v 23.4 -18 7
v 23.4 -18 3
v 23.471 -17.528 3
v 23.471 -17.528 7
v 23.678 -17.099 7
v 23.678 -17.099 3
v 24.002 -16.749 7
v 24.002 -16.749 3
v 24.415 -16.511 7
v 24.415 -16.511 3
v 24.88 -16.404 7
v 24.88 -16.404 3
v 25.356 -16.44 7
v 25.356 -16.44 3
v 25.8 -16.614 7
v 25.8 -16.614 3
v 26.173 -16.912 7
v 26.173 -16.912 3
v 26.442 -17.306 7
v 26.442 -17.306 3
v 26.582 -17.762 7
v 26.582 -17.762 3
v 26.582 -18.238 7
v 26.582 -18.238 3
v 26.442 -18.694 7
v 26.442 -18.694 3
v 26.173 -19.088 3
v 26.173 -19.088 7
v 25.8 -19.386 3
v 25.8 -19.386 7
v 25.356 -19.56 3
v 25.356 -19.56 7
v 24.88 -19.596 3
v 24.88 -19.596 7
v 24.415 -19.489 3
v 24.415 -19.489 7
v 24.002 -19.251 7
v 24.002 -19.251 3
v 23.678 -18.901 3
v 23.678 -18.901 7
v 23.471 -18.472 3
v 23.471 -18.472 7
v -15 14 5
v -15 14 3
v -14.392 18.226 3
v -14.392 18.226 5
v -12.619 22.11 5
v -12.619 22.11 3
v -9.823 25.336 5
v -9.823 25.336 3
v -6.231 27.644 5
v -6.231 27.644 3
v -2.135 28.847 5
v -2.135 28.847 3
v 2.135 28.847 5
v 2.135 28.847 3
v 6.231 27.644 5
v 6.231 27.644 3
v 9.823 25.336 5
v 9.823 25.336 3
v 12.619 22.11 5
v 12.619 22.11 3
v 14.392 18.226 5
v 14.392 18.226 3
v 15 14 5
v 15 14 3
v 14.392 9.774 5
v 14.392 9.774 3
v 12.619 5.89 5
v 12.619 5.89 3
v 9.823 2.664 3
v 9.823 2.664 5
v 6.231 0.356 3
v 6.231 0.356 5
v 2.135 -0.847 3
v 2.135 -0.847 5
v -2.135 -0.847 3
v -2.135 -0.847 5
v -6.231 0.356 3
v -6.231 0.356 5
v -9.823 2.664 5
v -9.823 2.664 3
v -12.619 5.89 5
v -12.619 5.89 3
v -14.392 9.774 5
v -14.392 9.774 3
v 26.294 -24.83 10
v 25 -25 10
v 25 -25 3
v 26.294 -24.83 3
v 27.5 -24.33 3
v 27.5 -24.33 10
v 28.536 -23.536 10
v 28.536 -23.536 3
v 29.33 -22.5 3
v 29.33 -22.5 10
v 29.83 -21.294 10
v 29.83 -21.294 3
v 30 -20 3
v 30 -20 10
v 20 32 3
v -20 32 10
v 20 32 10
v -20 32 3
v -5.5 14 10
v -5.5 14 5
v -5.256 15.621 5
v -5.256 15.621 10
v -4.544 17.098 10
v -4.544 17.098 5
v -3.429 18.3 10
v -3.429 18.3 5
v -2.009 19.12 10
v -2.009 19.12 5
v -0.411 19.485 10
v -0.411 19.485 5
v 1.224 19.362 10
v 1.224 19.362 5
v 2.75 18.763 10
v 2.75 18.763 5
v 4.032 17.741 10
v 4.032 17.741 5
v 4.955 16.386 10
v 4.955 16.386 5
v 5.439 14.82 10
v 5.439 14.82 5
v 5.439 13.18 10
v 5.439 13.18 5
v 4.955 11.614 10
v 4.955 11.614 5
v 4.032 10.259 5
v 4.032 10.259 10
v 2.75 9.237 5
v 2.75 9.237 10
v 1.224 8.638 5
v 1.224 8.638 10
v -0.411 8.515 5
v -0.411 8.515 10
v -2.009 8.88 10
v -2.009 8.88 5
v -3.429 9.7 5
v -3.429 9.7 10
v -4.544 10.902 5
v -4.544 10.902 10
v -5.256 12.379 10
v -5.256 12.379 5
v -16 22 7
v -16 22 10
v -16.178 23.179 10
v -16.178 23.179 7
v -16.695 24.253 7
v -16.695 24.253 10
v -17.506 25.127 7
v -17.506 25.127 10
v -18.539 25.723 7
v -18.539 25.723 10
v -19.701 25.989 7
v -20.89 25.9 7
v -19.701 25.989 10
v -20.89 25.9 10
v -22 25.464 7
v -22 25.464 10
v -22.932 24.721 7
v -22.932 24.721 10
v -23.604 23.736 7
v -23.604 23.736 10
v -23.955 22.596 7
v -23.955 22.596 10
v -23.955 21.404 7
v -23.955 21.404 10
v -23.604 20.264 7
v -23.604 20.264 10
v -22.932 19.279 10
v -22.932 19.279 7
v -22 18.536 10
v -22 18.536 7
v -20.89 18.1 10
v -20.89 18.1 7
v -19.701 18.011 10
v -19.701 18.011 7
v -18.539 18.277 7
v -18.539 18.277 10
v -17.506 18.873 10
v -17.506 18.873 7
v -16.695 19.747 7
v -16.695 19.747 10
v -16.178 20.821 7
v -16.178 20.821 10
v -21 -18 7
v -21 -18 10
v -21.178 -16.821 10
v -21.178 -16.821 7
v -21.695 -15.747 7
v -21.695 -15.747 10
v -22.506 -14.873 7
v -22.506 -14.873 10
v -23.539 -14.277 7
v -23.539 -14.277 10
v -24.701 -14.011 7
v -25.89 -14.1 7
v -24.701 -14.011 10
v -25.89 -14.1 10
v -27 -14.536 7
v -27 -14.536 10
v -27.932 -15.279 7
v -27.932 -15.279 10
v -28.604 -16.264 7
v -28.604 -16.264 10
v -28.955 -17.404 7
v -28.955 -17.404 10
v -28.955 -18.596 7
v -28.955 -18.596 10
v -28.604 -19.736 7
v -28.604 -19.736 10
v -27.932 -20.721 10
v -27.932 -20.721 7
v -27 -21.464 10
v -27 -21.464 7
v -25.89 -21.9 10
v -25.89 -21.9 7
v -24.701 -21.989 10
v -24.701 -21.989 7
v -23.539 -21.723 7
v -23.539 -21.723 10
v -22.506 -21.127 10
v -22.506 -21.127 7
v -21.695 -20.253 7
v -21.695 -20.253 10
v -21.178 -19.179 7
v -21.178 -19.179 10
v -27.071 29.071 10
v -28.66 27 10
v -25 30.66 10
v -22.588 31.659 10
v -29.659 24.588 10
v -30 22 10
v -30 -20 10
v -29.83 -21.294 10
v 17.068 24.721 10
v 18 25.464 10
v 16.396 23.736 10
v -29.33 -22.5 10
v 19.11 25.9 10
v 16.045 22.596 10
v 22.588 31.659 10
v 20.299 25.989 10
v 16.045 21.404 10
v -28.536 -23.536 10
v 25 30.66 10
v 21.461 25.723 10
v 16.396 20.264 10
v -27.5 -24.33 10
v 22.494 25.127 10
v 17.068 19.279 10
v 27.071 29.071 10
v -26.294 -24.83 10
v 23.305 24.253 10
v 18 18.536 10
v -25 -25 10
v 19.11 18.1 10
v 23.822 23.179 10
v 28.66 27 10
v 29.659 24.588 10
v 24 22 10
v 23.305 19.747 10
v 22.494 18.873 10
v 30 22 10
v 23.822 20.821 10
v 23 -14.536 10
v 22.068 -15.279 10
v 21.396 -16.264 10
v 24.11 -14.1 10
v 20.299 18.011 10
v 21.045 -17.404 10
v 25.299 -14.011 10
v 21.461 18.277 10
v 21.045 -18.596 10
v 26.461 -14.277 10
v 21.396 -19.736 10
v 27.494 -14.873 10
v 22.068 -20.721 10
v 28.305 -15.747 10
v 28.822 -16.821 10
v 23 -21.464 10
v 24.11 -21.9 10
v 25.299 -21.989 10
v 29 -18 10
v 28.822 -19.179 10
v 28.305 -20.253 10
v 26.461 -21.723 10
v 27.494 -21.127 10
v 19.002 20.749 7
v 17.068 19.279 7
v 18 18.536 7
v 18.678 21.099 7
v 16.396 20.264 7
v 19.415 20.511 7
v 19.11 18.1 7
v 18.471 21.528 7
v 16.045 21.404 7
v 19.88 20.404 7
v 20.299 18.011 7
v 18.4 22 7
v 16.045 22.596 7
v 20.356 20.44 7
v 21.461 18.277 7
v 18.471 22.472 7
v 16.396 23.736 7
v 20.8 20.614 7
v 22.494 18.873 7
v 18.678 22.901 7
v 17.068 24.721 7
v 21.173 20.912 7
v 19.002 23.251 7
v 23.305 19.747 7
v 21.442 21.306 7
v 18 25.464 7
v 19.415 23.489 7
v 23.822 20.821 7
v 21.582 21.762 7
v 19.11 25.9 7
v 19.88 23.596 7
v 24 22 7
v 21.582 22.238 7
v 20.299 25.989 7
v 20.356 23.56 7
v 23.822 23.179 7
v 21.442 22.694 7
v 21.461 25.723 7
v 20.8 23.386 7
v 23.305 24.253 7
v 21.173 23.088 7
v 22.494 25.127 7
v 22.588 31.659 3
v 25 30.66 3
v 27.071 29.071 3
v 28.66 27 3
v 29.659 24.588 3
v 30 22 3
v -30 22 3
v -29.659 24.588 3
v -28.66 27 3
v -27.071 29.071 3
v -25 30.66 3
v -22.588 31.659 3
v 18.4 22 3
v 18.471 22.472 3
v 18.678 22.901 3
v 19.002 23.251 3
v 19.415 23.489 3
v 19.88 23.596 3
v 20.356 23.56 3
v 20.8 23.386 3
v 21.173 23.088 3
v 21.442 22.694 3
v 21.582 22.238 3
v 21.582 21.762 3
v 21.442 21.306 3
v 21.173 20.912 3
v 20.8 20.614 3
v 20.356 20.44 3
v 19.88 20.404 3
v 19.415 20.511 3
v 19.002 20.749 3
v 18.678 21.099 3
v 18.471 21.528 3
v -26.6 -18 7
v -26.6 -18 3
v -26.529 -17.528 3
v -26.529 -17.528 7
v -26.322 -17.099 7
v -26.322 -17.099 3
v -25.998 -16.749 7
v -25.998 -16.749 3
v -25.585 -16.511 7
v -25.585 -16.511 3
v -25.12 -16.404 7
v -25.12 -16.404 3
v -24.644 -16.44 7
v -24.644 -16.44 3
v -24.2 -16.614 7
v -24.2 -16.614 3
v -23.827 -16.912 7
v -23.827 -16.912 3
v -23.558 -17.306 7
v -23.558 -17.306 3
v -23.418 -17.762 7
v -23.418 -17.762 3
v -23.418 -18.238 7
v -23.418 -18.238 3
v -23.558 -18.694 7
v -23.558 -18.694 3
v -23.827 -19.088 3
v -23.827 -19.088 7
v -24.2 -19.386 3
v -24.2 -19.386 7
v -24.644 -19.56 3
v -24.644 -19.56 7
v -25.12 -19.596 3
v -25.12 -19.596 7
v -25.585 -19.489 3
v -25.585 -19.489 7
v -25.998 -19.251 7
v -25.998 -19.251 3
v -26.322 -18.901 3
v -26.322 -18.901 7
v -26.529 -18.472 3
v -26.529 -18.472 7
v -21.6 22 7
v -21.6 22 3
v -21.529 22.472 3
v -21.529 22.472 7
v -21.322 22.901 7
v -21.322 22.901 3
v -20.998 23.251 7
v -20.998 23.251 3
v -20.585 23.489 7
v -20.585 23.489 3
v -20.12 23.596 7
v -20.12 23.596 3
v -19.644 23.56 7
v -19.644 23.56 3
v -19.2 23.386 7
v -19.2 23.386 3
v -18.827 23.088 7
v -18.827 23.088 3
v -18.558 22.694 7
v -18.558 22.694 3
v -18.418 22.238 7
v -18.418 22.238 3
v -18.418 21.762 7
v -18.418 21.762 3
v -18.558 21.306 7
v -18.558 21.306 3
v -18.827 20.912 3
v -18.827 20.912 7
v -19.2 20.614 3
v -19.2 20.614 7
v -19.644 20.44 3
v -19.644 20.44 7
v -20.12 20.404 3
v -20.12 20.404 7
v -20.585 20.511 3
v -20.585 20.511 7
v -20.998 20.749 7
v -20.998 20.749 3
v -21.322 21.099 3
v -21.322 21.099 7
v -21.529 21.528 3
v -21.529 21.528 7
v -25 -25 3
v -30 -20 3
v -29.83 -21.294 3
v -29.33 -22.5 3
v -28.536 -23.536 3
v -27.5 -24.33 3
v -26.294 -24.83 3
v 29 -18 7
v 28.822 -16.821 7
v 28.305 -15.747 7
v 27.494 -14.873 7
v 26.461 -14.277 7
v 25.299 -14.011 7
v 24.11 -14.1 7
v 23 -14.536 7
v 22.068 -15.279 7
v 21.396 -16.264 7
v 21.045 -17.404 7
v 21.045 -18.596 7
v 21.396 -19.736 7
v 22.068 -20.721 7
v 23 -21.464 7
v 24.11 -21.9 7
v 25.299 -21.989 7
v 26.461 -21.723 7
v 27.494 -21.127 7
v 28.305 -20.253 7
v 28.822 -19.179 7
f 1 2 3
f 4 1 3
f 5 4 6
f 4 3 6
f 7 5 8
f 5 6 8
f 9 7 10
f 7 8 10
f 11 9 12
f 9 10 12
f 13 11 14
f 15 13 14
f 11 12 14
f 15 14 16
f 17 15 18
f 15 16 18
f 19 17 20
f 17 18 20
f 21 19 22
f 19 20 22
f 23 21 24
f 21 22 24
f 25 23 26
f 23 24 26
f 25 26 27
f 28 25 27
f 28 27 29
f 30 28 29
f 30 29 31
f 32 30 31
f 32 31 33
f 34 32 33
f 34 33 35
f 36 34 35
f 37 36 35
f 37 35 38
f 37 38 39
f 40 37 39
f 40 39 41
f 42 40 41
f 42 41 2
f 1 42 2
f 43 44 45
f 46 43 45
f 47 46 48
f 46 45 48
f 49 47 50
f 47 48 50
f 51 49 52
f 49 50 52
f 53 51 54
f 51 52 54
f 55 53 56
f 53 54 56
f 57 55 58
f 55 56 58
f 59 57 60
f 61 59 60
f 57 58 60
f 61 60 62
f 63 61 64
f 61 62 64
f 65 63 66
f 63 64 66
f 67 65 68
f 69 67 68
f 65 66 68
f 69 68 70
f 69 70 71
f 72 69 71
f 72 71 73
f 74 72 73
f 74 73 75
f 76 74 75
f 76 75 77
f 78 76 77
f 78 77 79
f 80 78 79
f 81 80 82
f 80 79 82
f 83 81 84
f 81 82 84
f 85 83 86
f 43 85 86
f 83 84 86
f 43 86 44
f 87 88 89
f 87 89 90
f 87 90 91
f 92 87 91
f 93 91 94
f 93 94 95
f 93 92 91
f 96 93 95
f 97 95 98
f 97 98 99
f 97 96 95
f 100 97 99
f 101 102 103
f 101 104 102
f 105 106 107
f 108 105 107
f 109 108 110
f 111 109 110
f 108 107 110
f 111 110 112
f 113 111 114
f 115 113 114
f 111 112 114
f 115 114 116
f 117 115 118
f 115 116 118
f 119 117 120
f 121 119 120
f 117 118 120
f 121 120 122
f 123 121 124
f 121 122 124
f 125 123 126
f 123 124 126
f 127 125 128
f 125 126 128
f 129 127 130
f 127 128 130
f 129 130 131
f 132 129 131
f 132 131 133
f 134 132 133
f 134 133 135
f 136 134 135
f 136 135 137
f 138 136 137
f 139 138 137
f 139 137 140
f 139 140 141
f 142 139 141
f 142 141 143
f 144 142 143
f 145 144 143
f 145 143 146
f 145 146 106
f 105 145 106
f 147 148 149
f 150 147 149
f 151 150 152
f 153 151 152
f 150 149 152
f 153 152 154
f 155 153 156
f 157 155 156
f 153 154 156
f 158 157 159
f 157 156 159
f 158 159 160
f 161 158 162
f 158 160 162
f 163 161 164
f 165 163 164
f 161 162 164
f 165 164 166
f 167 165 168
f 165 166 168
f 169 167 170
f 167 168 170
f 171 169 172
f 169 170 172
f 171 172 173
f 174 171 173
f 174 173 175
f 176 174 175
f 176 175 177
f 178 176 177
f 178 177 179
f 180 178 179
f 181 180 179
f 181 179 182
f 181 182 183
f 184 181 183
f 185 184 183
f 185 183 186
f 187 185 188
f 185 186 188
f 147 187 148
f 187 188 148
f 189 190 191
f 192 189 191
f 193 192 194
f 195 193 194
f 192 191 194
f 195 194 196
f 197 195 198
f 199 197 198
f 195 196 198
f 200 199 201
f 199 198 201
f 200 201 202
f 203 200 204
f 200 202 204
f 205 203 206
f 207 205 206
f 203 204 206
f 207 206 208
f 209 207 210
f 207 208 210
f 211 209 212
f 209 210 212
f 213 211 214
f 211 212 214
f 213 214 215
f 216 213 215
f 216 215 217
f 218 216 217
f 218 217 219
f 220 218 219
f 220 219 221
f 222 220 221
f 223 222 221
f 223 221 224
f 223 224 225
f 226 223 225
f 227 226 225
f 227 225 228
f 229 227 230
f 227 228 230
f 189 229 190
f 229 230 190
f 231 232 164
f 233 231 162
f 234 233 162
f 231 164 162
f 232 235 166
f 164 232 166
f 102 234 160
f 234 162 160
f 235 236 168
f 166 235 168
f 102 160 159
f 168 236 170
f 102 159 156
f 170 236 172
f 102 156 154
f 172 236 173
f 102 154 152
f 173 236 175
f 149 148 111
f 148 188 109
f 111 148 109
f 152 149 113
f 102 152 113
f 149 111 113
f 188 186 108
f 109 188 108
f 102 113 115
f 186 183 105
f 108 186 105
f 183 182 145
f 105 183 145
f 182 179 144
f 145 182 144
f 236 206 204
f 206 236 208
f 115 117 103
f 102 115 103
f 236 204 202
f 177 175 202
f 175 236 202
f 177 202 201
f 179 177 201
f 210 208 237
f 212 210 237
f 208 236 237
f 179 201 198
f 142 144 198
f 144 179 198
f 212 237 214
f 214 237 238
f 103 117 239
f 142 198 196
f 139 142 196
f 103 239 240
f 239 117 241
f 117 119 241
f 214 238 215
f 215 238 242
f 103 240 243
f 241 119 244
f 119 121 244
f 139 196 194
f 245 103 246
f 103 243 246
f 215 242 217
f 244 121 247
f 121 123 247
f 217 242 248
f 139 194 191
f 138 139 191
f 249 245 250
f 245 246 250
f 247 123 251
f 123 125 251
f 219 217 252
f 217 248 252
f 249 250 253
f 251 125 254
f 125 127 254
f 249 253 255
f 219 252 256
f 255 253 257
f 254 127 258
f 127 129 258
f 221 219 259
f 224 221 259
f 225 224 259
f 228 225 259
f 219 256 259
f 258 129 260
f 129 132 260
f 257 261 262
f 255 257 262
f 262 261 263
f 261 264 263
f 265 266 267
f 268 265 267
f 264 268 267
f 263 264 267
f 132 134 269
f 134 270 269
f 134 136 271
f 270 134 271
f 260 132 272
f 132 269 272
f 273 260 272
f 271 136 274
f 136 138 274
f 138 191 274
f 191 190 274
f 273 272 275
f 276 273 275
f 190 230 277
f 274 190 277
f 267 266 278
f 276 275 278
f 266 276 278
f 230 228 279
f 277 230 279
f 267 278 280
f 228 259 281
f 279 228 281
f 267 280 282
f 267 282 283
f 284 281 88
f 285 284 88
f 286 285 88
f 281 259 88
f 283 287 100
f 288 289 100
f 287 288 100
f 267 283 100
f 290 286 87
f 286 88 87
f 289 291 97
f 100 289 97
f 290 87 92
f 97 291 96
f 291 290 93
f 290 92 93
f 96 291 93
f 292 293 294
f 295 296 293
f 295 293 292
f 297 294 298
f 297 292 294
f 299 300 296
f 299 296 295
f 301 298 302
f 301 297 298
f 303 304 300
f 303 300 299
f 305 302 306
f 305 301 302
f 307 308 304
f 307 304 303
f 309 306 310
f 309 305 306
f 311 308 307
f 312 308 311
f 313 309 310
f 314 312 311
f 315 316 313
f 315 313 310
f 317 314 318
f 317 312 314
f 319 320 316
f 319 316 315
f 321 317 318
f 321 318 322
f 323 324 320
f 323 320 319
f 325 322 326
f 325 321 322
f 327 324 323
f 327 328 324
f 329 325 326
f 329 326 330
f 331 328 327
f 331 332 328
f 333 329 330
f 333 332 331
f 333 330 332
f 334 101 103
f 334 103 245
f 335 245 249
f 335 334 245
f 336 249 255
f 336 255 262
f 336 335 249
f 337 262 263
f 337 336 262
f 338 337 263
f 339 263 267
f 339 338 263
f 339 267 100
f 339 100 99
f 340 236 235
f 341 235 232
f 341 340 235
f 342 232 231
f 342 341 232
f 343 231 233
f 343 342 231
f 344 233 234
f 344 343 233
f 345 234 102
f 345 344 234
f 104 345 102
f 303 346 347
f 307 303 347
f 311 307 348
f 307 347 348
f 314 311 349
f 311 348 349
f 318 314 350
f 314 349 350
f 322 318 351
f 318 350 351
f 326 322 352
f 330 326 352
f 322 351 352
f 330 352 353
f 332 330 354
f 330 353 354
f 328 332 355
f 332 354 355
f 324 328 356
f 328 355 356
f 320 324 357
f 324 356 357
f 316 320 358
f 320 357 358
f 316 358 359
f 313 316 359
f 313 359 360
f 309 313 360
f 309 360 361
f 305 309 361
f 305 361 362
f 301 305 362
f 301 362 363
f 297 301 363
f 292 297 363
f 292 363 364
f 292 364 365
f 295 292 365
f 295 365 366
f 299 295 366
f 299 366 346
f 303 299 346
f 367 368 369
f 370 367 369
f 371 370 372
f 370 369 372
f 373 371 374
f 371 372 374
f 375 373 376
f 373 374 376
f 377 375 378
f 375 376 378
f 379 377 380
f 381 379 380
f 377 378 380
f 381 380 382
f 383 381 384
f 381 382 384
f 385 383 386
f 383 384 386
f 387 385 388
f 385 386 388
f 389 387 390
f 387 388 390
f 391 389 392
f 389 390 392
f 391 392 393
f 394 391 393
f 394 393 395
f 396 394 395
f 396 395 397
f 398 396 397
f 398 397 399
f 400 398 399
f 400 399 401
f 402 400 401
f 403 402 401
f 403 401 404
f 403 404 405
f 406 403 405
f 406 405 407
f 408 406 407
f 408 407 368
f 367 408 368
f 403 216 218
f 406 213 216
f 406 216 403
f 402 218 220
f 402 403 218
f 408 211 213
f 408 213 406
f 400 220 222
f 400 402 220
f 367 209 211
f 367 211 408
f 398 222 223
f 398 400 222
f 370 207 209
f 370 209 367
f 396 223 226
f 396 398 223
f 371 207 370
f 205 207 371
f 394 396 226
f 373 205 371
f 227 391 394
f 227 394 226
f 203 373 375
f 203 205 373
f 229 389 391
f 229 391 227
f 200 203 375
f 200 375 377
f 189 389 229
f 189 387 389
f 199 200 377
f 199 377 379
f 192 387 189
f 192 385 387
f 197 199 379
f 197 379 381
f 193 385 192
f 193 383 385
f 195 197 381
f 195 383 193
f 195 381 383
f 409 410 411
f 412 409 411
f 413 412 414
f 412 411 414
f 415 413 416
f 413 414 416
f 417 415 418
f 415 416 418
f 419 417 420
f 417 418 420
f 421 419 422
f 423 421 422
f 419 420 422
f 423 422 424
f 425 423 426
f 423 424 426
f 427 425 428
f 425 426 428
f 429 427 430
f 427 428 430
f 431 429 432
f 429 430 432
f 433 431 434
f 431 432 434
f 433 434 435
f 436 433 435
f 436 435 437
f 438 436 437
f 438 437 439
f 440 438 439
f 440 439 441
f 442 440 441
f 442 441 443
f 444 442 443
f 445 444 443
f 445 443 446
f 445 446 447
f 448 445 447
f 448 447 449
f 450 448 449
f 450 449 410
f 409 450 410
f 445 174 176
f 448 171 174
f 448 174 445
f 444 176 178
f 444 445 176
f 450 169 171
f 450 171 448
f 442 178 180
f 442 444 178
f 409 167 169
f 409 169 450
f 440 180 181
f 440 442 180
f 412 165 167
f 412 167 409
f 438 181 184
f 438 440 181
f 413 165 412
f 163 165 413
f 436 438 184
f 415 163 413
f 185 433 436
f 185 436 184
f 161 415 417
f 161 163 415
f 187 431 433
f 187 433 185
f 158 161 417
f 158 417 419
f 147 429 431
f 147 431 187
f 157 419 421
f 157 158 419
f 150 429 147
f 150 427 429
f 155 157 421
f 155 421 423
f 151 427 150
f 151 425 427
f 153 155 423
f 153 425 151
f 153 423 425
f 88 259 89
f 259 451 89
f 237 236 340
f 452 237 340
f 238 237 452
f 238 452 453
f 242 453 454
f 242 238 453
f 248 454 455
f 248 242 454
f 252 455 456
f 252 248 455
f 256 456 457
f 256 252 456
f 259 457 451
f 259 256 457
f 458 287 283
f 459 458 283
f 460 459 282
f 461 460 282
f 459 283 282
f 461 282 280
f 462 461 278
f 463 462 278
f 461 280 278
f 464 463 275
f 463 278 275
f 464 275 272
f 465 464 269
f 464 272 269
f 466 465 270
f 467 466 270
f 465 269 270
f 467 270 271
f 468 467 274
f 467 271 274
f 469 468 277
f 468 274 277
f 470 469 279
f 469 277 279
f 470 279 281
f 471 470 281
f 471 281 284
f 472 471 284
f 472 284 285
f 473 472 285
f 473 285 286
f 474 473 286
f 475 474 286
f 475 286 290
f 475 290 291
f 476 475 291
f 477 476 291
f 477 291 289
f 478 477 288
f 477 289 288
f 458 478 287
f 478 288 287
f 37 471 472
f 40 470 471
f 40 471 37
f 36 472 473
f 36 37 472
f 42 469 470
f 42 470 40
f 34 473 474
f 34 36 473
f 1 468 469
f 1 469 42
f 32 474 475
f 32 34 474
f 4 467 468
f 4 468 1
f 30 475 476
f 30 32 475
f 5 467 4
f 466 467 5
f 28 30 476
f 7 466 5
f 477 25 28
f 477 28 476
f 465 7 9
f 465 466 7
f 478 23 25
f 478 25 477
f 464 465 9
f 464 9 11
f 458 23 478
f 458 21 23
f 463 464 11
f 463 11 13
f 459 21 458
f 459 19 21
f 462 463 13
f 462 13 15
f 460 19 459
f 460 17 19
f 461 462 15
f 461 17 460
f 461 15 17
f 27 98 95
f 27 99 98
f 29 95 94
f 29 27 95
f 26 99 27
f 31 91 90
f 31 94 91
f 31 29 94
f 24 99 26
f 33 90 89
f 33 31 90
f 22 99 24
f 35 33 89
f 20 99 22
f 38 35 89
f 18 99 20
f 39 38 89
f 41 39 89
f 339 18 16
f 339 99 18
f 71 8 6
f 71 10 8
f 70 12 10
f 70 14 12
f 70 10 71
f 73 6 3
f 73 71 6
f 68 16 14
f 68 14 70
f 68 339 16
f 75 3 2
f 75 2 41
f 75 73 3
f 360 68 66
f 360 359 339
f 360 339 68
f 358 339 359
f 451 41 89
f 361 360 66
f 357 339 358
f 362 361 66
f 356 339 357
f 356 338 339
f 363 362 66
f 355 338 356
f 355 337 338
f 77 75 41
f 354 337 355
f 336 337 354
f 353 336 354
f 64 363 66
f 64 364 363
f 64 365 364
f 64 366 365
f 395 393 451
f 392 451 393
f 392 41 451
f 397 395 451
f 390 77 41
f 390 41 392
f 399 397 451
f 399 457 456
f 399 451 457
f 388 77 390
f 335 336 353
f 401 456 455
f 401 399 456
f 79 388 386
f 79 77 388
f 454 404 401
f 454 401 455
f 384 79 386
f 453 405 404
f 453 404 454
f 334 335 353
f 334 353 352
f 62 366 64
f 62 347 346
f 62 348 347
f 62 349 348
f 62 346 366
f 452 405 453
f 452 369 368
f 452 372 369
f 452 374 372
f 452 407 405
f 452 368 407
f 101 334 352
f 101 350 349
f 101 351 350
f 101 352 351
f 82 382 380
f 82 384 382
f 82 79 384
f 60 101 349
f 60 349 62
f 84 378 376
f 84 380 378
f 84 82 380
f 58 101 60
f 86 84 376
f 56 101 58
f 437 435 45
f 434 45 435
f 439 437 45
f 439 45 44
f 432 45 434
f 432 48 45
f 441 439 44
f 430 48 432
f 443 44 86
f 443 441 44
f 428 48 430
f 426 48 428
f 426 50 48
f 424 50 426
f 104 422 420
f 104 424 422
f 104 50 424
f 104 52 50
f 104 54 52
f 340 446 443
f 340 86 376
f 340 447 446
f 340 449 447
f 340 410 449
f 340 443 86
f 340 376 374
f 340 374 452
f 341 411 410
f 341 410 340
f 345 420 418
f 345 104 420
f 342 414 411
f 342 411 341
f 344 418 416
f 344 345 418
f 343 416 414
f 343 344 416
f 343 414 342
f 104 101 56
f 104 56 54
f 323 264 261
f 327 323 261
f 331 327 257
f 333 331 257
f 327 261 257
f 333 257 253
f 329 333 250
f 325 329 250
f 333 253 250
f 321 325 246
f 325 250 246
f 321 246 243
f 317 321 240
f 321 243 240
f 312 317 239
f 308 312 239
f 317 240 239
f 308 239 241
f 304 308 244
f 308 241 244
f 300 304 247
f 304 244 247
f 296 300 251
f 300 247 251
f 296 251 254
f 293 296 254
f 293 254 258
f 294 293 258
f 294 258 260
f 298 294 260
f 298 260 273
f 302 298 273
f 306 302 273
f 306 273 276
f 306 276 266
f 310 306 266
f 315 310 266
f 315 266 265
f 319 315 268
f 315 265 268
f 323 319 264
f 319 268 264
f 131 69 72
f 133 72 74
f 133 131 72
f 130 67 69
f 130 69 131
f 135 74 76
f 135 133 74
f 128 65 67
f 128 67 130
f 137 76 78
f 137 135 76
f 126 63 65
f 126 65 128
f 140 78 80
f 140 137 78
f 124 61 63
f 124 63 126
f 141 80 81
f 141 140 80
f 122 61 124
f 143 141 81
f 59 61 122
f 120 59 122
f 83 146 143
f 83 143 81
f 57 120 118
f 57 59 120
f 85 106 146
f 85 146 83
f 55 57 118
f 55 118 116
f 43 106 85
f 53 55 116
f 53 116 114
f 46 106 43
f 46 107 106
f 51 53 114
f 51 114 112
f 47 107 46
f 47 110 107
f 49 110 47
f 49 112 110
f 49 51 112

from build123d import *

# Parameters (mm, degrees)
SKETCH_1_W          = 60
SKETCH_1_H          = 50
SKETCH_1_R          = 15
EXTRUDE_5_DEPTH     = 5
SKETCH_4_W          = 60
SKETCH_4_H          = 50
SKETCH_4_R          = 5.5
EXTRUDE_6_DEPTH     = 5
SKETCH_5_R          = 1.6
CUT_EXTRUDE_1_DEPTH = 10
SKETCH_6_W          = 60
SKETCH_6_H          = 10
EXTRUDE_7_DEPTH     = 7
FILLET_3_R          = 10
FILLET_5_R          = 10
FILLET_6_R          = 5
FILLET_7_R          = 5
SKETCH_8_R          = 41.984876442
CUT_EXTRUDE_3_DEPTH = 3
SKETCH_7_R          = 4
CUT_EXTRUDE_4_DEPTH = 3
SKETCH_9_R          = 15
EXTRUDE_8_DEPTH     = 7
SKETCH_10_R         = 15
CUT_EXTRUDE_5_DEPTH = 2
SKETCH_11_R         = 5.5
CUT_EXTRUDE_6_DEPTH = 45.147480109


with BuildPart() as part:
    # 草图1 → 凸台-拉伸5 (new body)
    with BuildSketch(Plane.XY):
        Rectangle(SKETCH_1_W, SKETCH_1_H)
        Circle(SKETCH_1_R, mode=Mode.SUBTRACT)
    extrude(amount=EXTRUDE_5_DEPTH)

    # 草图4 → 凸台-拉伸6 (add)
    with BuildSketch(Plane.XY.offset(5)):
        Rectangle(SKETCH_4_W, SKETCH_4_H)
        Circle(SKETCH_4_R, mode=Mode.SUBTRACT)
    extrude(amount=EXTRUDE_6_DEPTH)

    # 草图5 → 切除-拉伸1 (cut)
    with BuildSketch(Plane(origin=(0, 0, 0), x_dir=(-1, 0, 0), z_dir=(0, 0, -1))):
        with Locations((-20, 22)):
            Circle(SKETCH_5_R)
        with Locations((-25, -18)):
            Circle(SKETCH_5_R)
        with Locations((20, 22)):
            Circle(SKETCH_5_R)
        with Locations((25, -18)):
            Circle(SKETCH_5_R)
    extrude(amount=-CUT_EXTRUDE_1_DEPTH, mode=Mode.SUBTRACT)

    # 草图6 → 凸台-拉伸7 (add)
    with BuildSketch(Plane(origin=(0, 25, 0), x_dir=(1, 0, 0), z_dir=(0, 1, 0))):
        with Locations((0, -5)):
            Rectangle(SKETCH_6_W, SKETCH_6_H)
    extrude(amount=EXTRUDE_7_DEPTH)

    # 圆角3
    fillet_3_edges = [part.edges().sort_by_distance(p)[0] for p in [
        (-30, 32, 5),
    ]]
    fillet(fillet_3_edges, radius=FILLET_3_R)

    # 圆角5
    fillet_5_edges = [part.edges().sort_by_distance(p)[0] for p in [
        (30, 32, 5),
    ]]
    fillet(fillet_5_edges, radius=FILLET_5_R)

    # 圆角6
    fillet_6_edges = [part.edges().sort_by_distance(p)[0] for p in [
        (-30, -25, 5),
    ]]
    fillet(fillet_6_edges, radius=FILLET_6_R)

    # 圆角7
    fillet_7_edges = [part.edges().sort_by_distance(p)[0] for p in [
        (30, -25, 5),
    ]]
    fillet(fillet_7_edges, radius=FILLET_7_R)

    # 草图8 → 切除-拉伸3 (cut)
    with BuildSketch(Plane(origin=(0, 0, 0), x_dir=(-1, 0, 0), z_dir=(0, 0, -1))):
        Circle(SKETCH_8_R)
    extrude(amount=-CUT_EXTRUDE_3_DEPTH, mode=Mode.SUBTRACT)

    # 草图7 → 切除-拉伸4 (cut)
    with BuildSketch(Plane.XY.offset(10)):
        with Locations((-20, 22)):
            Circle(SKETCH_7_R)
        with Locations((20, 22)):
            Circle(SKETCH_7_R)
        with Locations((-25, -18)):
            Circle(SKETCH_7_R)
        with Locations((25, -18)):
            Circle(SKETCH_7_R)
    extrude(amount=-CUT_EXTRUDE_4_DEPTH, mode=Mode.SUBTRACT)

    # 草图9 → 凸台-拉伸8 (add)
    with BuildSketch(Plane(origin=(0, 0, 3), x_dir=(-1, 0, 0), z_dir=(0, 0, -1))):
        Circle(SKETCH_9_R)
    extrude(amount=-EXTRUDE_8_DEPTH)

    # 草图10 → 切除-拉伸5 (cut)
    with BuildSketch(Plane(origin=(0, 0, 3), x_dir=(-1, 0, 0), z_dir=(0, 0, -1))):
        with Locations((0, 14)):
            Circle(SKETCH_10_R)
    extrude(amount=-CUT_EXTRUDE_5_DEPTH, mode=Mode.SUBTRACT)

    # 草图11 → 切除-拉伸6 (cut, through all)
    with BuildSketch(Plane(origin=(0, 0, 5), x_dir=(-1, 0, 0), z_dir=(0, 0, -1))):
        with Locations((0, 14)):
            Circle(SKETCH_11_R)
    extrude(amount=-CUT_EXTRUDE_6_DEPTH, mode=Mode.SUBTRACT)


solid = part.part
